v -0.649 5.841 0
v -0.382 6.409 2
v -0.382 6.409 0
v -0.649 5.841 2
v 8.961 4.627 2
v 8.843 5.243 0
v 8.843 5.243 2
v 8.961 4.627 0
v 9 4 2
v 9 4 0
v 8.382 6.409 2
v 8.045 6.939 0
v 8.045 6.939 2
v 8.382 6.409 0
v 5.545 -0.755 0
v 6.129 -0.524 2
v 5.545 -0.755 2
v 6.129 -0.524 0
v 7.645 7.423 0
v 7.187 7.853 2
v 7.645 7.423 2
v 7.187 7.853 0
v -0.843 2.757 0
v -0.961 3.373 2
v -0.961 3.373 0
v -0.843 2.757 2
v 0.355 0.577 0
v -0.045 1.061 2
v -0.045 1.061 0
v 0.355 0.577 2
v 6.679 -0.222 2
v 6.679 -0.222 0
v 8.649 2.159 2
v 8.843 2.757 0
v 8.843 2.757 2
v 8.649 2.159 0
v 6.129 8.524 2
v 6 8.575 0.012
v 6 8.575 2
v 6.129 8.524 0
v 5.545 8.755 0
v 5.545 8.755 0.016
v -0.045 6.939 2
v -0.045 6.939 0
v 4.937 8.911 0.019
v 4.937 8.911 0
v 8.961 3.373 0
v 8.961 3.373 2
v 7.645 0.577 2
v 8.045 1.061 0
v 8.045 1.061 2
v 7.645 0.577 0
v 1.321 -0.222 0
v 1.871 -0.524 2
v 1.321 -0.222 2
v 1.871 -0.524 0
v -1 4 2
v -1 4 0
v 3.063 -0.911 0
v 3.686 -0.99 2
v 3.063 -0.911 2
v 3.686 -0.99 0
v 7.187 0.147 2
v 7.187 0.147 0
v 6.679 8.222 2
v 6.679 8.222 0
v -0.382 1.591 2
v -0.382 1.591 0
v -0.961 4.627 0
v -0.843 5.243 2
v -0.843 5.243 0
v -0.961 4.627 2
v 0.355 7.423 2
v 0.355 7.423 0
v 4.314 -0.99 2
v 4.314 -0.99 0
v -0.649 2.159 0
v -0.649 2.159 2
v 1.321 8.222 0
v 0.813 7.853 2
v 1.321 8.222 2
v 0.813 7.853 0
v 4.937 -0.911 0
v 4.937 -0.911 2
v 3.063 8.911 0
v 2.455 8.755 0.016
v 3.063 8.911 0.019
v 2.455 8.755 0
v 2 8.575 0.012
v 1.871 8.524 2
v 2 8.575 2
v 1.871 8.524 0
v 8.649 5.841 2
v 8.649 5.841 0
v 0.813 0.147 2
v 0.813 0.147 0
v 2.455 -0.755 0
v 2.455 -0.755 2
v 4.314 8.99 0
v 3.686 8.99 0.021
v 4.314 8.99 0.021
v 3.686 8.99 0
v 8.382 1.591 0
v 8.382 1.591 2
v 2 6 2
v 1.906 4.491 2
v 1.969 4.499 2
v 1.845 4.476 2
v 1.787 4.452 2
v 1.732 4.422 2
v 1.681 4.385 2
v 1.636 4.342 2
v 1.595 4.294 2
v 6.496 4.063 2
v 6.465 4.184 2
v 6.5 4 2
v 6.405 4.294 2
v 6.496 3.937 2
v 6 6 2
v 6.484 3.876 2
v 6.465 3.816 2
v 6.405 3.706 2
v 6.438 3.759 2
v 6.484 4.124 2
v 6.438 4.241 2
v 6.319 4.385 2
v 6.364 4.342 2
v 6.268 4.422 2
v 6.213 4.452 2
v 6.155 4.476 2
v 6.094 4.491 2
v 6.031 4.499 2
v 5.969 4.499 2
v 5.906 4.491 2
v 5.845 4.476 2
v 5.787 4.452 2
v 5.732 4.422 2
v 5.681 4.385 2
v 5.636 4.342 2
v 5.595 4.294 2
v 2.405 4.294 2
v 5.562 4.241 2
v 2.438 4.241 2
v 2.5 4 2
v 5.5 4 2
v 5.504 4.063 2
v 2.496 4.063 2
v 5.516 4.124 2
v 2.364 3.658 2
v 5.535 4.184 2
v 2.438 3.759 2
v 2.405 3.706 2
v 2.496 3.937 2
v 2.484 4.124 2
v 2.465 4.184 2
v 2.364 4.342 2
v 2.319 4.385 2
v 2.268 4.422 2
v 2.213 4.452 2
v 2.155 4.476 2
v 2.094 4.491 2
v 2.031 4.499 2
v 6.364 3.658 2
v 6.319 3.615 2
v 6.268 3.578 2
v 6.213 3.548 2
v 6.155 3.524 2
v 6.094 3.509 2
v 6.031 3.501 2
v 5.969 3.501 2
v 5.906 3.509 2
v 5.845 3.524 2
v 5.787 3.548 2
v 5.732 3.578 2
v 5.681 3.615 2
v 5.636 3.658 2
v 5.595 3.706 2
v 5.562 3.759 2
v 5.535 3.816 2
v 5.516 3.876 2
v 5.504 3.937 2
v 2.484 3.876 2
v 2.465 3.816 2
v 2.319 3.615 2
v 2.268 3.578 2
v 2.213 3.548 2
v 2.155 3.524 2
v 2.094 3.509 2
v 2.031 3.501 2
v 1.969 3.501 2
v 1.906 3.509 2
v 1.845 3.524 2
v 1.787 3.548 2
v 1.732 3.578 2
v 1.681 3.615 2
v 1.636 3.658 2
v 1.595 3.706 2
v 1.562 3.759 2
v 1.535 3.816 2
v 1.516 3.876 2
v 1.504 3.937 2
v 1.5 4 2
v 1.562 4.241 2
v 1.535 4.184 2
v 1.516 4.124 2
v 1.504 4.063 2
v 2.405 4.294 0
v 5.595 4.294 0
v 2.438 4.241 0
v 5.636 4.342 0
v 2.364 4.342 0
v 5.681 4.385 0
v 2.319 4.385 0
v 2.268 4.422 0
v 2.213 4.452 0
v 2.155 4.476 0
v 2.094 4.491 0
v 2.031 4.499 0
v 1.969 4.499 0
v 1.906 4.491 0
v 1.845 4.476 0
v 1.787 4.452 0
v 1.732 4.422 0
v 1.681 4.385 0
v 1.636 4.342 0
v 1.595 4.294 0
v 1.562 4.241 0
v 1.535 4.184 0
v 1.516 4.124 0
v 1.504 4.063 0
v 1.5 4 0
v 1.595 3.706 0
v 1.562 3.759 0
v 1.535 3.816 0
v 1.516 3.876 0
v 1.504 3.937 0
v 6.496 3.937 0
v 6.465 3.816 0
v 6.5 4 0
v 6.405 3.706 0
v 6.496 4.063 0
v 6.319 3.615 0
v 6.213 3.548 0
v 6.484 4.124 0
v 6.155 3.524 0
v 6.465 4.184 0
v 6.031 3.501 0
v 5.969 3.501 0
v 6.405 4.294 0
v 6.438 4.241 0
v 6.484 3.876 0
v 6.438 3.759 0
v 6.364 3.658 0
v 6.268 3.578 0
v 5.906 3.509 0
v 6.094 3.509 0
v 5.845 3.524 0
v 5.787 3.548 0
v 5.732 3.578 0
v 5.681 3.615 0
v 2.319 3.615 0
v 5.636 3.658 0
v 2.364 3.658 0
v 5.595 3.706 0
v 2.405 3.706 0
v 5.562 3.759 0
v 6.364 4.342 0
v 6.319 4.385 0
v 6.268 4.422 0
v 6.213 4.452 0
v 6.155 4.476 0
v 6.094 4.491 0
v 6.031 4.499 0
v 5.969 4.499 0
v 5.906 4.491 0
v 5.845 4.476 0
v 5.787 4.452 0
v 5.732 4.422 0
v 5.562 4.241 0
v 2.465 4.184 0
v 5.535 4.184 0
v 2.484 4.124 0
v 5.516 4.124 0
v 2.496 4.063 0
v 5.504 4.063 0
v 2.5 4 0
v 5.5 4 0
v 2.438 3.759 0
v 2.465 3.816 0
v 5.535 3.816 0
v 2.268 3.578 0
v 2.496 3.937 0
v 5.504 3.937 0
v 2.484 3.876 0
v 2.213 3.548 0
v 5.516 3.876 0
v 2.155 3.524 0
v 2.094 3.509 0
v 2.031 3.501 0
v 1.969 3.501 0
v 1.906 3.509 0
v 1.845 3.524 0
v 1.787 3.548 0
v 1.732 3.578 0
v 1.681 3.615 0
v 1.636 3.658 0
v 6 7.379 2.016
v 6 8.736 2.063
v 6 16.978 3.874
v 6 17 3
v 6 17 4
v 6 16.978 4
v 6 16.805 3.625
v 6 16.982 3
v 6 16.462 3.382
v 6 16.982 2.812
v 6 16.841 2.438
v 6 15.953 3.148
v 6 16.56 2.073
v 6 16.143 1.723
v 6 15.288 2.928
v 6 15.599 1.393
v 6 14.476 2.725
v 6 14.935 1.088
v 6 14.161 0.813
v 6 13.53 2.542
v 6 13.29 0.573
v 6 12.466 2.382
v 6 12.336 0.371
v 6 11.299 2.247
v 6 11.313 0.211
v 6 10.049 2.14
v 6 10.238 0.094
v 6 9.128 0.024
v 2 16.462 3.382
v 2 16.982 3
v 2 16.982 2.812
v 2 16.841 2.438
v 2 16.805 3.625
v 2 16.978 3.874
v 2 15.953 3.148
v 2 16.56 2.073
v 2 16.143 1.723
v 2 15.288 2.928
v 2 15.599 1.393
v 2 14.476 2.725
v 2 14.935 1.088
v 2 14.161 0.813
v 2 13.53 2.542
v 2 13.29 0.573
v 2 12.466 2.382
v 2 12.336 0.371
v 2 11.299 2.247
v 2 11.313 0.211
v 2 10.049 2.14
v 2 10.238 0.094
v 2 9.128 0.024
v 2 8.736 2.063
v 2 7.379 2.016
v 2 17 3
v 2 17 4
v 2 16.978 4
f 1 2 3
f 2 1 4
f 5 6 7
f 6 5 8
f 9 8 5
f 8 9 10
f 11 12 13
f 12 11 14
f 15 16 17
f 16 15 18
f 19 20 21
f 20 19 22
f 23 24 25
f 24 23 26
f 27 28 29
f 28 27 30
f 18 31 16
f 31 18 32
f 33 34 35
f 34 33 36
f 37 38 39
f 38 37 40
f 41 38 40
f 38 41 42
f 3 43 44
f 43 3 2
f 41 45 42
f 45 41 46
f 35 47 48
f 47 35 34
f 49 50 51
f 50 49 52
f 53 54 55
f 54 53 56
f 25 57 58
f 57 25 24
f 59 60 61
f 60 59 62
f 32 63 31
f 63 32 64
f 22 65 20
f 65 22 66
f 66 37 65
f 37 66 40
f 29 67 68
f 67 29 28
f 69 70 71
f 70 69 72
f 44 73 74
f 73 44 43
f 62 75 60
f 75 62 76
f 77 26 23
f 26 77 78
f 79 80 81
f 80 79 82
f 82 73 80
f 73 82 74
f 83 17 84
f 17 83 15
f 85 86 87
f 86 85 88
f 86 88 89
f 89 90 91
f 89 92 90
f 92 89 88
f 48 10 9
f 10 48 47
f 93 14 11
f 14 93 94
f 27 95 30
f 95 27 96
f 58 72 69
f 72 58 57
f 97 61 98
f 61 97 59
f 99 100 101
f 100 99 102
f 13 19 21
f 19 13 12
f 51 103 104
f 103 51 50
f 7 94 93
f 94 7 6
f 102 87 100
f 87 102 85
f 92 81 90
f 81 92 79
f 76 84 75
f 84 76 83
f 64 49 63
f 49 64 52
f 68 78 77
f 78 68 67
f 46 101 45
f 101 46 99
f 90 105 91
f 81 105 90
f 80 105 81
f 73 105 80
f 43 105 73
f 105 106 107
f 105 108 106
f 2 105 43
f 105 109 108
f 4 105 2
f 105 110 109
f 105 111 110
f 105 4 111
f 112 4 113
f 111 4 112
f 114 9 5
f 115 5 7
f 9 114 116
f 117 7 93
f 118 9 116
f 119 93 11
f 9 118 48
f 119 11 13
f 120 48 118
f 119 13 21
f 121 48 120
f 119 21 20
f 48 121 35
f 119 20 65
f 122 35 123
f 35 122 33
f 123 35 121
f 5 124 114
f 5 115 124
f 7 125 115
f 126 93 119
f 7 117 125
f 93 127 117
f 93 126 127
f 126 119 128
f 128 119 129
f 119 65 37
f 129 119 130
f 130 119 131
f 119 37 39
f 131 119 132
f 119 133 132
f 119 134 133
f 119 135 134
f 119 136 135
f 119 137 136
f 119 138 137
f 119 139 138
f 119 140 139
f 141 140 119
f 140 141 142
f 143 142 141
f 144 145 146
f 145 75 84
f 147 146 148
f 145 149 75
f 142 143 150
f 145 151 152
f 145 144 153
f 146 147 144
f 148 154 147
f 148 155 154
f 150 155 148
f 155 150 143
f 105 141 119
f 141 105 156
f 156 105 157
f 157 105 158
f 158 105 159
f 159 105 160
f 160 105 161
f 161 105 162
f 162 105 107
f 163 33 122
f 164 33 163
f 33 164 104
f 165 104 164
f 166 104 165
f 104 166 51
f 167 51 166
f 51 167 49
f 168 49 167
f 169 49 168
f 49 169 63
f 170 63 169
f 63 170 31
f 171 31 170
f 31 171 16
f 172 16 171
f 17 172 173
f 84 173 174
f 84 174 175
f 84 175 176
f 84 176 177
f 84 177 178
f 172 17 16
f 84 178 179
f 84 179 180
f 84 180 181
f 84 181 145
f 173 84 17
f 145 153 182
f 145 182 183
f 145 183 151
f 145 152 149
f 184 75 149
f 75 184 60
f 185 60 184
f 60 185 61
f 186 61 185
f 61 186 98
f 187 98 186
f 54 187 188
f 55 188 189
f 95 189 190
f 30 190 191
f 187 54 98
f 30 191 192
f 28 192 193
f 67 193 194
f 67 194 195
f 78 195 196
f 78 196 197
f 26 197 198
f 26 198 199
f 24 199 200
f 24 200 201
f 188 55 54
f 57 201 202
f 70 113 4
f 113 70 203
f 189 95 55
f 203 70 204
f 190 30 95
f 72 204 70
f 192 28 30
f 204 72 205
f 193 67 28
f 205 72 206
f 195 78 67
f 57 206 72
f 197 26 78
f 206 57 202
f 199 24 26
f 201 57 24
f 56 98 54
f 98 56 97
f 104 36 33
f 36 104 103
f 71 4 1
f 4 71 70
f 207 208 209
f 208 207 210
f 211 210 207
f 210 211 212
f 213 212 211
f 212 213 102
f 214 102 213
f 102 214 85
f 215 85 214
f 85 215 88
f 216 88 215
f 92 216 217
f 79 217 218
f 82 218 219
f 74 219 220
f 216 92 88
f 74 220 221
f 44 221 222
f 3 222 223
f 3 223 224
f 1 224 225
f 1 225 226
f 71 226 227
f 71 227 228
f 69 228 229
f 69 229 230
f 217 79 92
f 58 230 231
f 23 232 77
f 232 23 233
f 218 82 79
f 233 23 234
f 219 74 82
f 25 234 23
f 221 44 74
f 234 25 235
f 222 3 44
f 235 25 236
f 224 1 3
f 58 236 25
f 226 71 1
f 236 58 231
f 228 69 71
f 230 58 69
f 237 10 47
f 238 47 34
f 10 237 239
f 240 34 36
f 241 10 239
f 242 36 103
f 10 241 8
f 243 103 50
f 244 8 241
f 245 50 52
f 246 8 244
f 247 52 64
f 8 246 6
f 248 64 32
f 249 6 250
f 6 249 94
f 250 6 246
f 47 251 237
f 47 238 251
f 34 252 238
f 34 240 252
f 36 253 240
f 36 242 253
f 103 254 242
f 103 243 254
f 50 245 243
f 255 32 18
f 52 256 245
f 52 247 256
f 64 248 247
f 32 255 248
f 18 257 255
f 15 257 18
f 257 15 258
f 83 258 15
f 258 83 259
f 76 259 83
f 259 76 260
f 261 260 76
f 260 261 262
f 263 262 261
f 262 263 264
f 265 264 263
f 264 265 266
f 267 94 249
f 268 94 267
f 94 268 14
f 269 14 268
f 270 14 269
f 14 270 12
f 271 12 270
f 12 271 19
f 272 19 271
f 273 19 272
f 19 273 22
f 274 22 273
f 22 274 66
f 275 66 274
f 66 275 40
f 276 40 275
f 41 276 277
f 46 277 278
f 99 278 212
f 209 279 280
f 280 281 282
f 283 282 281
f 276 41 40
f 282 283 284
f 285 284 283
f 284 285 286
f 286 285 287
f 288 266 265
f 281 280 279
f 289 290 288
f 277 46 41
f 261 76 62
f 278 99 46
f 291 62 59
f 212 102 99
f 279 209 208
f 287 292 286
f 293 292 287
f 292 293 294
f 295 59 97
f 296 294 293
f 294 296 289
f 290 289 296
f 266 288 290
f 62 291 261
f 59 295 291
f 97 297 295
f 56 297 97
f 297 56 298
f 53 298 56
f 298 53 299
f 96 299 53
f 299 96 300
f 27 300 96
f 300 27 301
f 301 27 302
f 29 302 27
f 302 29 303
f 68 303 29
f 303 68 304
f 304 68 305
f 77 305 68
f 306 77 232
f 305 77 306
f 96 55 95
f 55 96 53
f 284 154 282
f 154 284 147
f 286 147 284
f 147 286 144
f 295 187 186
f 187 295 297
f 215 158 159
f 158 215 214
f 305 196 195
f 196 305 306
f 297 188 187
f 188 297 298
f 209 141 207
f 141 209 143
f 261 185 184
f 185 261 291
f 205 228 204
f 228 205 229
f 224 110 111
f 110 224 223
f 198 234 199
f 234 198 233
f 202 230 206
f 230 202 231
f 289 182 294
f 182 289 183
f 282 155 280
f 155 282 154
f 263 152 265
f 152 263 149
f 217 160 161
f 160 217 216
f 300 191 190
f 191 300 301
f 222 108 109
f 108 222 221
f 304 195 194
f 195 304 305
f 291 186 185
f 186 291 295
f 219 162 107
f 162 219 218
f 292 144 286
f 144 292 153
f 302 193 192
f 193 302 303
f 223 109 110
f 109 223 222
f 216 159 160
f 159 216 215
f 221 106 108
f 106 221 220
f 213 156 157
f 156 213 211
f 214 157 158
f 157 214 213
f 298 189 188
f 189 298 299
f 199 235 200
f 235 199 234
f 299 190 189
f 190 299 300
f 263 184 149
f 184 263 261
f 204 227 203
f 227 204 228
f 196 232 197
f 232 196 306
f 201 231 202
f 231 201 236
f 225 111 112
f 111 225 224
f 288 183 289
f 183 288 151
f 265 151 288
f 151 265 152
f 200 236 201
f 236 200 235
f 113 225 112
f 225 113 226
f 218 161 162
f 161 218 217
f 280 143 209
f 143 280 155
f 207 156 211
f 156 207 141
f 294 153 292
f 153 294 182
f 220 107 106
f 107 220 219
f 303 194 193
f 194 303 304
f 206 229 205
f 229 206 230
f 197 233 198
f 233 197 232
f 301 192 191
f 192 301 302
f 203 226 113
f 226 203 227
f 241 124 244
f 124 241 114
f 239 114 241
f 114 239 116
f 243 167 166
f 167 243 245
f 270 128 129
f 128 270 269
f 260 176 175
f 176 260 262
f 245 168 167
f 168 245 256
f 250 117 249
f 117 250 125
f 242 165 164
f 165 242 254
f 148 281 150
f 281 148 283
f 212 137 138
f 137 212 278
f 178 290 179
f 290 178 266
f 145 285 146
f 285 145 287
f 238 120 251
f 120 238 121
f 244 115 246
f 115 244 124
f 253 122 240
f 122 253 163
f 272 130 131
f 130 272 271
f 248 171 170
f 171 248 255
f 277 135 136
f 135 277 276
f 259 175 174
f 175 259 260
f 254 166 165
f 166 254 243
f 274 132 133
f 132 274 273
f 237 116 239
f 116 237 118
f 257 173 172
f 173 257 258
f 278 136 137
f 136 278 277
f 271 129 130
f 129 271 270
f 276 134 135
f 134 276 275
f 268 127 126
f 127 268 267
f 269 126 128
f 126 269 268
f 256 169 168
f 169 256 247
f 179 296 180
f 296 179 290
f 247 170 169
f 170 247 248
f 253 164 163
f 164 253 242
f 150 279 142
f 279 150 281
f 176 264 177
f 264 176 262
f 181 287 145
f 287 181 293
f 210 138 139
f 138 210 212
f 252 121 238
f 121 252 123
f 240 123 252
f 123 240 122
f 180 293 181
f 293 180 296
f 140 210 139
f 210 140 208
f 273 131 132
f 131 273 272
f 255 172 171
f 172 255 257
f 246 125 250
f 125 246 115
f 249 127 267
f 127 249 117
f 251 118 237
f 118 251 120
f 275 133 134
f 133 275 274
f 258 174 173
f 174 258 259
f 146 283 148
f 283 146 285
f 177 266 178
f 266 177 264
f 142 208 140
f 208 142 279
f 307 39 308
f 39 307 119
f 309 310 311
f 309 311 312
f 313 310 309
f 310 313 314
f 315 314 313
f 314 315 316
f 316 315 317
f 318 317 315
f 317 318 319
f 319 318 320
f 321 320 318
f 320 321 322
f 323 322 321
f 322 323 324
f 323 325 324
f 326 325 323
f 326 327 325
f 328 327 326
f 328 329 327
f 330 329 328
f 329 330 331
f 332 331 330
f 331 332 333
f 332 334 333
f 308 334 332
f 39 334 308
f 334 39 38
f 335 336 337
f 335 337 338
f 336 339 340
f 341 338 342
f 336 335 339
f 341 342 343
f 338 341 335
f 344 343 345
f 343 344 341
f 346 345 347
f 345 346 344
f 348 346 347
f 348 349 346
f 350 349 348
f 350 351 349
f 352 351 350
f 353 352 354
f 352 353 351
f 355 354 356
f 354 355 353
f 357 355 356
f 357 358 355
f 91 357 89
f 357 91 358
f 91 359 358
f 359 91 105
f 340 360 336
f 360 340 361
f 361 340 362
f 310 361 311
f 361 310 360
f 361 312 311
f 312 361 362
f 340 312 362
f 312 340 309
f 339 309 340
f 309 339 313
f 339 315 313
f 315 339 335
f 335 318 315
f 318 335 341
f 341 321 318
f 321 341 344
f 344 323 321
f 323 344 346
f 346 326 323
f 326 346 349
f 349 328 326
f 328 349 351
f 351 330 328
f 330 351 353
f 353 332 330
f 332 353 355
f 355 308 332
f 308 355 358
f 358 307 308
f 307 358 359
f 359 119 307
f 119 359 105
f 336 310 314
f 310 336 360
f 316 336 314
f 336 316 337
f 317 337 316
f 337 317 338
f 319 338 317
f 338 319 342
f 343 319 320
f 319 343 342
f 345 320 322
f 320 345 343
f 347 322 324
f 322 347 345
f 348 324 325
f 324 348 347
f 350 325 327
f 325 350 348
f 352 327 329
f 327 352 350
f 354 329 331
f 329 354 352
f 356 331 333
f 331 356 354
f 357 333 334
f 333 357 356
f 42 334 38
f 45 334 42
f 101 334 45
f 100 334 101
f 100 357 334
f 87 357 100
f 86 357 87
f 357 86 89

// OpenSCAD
$fn=50;

module slide() {
    rotate([0, 90, 0]) linear_extrude(height=4) difference()  {square(10);circle(10);}
}

difference() {
    translate([4, 4, 0]) cylinder(r=5, h=2, center=false);
    translate([2, 4, 0]) cylinder(r=0.5, h=2, center=false);
    translate([6, 4, 0]) cylinder(r=0.5, h=2, center=false);
}

translate([2, 8, 0]) {
    difference() {
        union() {
            cube(size=[4, 9, 2], center=false);
            translate([0, -2, 4]) resize([4, 11, 2]) slide();
        }
        translate([0, 0, 3]) resize([4, 9, 3]) slide();
    }
}
    
    
